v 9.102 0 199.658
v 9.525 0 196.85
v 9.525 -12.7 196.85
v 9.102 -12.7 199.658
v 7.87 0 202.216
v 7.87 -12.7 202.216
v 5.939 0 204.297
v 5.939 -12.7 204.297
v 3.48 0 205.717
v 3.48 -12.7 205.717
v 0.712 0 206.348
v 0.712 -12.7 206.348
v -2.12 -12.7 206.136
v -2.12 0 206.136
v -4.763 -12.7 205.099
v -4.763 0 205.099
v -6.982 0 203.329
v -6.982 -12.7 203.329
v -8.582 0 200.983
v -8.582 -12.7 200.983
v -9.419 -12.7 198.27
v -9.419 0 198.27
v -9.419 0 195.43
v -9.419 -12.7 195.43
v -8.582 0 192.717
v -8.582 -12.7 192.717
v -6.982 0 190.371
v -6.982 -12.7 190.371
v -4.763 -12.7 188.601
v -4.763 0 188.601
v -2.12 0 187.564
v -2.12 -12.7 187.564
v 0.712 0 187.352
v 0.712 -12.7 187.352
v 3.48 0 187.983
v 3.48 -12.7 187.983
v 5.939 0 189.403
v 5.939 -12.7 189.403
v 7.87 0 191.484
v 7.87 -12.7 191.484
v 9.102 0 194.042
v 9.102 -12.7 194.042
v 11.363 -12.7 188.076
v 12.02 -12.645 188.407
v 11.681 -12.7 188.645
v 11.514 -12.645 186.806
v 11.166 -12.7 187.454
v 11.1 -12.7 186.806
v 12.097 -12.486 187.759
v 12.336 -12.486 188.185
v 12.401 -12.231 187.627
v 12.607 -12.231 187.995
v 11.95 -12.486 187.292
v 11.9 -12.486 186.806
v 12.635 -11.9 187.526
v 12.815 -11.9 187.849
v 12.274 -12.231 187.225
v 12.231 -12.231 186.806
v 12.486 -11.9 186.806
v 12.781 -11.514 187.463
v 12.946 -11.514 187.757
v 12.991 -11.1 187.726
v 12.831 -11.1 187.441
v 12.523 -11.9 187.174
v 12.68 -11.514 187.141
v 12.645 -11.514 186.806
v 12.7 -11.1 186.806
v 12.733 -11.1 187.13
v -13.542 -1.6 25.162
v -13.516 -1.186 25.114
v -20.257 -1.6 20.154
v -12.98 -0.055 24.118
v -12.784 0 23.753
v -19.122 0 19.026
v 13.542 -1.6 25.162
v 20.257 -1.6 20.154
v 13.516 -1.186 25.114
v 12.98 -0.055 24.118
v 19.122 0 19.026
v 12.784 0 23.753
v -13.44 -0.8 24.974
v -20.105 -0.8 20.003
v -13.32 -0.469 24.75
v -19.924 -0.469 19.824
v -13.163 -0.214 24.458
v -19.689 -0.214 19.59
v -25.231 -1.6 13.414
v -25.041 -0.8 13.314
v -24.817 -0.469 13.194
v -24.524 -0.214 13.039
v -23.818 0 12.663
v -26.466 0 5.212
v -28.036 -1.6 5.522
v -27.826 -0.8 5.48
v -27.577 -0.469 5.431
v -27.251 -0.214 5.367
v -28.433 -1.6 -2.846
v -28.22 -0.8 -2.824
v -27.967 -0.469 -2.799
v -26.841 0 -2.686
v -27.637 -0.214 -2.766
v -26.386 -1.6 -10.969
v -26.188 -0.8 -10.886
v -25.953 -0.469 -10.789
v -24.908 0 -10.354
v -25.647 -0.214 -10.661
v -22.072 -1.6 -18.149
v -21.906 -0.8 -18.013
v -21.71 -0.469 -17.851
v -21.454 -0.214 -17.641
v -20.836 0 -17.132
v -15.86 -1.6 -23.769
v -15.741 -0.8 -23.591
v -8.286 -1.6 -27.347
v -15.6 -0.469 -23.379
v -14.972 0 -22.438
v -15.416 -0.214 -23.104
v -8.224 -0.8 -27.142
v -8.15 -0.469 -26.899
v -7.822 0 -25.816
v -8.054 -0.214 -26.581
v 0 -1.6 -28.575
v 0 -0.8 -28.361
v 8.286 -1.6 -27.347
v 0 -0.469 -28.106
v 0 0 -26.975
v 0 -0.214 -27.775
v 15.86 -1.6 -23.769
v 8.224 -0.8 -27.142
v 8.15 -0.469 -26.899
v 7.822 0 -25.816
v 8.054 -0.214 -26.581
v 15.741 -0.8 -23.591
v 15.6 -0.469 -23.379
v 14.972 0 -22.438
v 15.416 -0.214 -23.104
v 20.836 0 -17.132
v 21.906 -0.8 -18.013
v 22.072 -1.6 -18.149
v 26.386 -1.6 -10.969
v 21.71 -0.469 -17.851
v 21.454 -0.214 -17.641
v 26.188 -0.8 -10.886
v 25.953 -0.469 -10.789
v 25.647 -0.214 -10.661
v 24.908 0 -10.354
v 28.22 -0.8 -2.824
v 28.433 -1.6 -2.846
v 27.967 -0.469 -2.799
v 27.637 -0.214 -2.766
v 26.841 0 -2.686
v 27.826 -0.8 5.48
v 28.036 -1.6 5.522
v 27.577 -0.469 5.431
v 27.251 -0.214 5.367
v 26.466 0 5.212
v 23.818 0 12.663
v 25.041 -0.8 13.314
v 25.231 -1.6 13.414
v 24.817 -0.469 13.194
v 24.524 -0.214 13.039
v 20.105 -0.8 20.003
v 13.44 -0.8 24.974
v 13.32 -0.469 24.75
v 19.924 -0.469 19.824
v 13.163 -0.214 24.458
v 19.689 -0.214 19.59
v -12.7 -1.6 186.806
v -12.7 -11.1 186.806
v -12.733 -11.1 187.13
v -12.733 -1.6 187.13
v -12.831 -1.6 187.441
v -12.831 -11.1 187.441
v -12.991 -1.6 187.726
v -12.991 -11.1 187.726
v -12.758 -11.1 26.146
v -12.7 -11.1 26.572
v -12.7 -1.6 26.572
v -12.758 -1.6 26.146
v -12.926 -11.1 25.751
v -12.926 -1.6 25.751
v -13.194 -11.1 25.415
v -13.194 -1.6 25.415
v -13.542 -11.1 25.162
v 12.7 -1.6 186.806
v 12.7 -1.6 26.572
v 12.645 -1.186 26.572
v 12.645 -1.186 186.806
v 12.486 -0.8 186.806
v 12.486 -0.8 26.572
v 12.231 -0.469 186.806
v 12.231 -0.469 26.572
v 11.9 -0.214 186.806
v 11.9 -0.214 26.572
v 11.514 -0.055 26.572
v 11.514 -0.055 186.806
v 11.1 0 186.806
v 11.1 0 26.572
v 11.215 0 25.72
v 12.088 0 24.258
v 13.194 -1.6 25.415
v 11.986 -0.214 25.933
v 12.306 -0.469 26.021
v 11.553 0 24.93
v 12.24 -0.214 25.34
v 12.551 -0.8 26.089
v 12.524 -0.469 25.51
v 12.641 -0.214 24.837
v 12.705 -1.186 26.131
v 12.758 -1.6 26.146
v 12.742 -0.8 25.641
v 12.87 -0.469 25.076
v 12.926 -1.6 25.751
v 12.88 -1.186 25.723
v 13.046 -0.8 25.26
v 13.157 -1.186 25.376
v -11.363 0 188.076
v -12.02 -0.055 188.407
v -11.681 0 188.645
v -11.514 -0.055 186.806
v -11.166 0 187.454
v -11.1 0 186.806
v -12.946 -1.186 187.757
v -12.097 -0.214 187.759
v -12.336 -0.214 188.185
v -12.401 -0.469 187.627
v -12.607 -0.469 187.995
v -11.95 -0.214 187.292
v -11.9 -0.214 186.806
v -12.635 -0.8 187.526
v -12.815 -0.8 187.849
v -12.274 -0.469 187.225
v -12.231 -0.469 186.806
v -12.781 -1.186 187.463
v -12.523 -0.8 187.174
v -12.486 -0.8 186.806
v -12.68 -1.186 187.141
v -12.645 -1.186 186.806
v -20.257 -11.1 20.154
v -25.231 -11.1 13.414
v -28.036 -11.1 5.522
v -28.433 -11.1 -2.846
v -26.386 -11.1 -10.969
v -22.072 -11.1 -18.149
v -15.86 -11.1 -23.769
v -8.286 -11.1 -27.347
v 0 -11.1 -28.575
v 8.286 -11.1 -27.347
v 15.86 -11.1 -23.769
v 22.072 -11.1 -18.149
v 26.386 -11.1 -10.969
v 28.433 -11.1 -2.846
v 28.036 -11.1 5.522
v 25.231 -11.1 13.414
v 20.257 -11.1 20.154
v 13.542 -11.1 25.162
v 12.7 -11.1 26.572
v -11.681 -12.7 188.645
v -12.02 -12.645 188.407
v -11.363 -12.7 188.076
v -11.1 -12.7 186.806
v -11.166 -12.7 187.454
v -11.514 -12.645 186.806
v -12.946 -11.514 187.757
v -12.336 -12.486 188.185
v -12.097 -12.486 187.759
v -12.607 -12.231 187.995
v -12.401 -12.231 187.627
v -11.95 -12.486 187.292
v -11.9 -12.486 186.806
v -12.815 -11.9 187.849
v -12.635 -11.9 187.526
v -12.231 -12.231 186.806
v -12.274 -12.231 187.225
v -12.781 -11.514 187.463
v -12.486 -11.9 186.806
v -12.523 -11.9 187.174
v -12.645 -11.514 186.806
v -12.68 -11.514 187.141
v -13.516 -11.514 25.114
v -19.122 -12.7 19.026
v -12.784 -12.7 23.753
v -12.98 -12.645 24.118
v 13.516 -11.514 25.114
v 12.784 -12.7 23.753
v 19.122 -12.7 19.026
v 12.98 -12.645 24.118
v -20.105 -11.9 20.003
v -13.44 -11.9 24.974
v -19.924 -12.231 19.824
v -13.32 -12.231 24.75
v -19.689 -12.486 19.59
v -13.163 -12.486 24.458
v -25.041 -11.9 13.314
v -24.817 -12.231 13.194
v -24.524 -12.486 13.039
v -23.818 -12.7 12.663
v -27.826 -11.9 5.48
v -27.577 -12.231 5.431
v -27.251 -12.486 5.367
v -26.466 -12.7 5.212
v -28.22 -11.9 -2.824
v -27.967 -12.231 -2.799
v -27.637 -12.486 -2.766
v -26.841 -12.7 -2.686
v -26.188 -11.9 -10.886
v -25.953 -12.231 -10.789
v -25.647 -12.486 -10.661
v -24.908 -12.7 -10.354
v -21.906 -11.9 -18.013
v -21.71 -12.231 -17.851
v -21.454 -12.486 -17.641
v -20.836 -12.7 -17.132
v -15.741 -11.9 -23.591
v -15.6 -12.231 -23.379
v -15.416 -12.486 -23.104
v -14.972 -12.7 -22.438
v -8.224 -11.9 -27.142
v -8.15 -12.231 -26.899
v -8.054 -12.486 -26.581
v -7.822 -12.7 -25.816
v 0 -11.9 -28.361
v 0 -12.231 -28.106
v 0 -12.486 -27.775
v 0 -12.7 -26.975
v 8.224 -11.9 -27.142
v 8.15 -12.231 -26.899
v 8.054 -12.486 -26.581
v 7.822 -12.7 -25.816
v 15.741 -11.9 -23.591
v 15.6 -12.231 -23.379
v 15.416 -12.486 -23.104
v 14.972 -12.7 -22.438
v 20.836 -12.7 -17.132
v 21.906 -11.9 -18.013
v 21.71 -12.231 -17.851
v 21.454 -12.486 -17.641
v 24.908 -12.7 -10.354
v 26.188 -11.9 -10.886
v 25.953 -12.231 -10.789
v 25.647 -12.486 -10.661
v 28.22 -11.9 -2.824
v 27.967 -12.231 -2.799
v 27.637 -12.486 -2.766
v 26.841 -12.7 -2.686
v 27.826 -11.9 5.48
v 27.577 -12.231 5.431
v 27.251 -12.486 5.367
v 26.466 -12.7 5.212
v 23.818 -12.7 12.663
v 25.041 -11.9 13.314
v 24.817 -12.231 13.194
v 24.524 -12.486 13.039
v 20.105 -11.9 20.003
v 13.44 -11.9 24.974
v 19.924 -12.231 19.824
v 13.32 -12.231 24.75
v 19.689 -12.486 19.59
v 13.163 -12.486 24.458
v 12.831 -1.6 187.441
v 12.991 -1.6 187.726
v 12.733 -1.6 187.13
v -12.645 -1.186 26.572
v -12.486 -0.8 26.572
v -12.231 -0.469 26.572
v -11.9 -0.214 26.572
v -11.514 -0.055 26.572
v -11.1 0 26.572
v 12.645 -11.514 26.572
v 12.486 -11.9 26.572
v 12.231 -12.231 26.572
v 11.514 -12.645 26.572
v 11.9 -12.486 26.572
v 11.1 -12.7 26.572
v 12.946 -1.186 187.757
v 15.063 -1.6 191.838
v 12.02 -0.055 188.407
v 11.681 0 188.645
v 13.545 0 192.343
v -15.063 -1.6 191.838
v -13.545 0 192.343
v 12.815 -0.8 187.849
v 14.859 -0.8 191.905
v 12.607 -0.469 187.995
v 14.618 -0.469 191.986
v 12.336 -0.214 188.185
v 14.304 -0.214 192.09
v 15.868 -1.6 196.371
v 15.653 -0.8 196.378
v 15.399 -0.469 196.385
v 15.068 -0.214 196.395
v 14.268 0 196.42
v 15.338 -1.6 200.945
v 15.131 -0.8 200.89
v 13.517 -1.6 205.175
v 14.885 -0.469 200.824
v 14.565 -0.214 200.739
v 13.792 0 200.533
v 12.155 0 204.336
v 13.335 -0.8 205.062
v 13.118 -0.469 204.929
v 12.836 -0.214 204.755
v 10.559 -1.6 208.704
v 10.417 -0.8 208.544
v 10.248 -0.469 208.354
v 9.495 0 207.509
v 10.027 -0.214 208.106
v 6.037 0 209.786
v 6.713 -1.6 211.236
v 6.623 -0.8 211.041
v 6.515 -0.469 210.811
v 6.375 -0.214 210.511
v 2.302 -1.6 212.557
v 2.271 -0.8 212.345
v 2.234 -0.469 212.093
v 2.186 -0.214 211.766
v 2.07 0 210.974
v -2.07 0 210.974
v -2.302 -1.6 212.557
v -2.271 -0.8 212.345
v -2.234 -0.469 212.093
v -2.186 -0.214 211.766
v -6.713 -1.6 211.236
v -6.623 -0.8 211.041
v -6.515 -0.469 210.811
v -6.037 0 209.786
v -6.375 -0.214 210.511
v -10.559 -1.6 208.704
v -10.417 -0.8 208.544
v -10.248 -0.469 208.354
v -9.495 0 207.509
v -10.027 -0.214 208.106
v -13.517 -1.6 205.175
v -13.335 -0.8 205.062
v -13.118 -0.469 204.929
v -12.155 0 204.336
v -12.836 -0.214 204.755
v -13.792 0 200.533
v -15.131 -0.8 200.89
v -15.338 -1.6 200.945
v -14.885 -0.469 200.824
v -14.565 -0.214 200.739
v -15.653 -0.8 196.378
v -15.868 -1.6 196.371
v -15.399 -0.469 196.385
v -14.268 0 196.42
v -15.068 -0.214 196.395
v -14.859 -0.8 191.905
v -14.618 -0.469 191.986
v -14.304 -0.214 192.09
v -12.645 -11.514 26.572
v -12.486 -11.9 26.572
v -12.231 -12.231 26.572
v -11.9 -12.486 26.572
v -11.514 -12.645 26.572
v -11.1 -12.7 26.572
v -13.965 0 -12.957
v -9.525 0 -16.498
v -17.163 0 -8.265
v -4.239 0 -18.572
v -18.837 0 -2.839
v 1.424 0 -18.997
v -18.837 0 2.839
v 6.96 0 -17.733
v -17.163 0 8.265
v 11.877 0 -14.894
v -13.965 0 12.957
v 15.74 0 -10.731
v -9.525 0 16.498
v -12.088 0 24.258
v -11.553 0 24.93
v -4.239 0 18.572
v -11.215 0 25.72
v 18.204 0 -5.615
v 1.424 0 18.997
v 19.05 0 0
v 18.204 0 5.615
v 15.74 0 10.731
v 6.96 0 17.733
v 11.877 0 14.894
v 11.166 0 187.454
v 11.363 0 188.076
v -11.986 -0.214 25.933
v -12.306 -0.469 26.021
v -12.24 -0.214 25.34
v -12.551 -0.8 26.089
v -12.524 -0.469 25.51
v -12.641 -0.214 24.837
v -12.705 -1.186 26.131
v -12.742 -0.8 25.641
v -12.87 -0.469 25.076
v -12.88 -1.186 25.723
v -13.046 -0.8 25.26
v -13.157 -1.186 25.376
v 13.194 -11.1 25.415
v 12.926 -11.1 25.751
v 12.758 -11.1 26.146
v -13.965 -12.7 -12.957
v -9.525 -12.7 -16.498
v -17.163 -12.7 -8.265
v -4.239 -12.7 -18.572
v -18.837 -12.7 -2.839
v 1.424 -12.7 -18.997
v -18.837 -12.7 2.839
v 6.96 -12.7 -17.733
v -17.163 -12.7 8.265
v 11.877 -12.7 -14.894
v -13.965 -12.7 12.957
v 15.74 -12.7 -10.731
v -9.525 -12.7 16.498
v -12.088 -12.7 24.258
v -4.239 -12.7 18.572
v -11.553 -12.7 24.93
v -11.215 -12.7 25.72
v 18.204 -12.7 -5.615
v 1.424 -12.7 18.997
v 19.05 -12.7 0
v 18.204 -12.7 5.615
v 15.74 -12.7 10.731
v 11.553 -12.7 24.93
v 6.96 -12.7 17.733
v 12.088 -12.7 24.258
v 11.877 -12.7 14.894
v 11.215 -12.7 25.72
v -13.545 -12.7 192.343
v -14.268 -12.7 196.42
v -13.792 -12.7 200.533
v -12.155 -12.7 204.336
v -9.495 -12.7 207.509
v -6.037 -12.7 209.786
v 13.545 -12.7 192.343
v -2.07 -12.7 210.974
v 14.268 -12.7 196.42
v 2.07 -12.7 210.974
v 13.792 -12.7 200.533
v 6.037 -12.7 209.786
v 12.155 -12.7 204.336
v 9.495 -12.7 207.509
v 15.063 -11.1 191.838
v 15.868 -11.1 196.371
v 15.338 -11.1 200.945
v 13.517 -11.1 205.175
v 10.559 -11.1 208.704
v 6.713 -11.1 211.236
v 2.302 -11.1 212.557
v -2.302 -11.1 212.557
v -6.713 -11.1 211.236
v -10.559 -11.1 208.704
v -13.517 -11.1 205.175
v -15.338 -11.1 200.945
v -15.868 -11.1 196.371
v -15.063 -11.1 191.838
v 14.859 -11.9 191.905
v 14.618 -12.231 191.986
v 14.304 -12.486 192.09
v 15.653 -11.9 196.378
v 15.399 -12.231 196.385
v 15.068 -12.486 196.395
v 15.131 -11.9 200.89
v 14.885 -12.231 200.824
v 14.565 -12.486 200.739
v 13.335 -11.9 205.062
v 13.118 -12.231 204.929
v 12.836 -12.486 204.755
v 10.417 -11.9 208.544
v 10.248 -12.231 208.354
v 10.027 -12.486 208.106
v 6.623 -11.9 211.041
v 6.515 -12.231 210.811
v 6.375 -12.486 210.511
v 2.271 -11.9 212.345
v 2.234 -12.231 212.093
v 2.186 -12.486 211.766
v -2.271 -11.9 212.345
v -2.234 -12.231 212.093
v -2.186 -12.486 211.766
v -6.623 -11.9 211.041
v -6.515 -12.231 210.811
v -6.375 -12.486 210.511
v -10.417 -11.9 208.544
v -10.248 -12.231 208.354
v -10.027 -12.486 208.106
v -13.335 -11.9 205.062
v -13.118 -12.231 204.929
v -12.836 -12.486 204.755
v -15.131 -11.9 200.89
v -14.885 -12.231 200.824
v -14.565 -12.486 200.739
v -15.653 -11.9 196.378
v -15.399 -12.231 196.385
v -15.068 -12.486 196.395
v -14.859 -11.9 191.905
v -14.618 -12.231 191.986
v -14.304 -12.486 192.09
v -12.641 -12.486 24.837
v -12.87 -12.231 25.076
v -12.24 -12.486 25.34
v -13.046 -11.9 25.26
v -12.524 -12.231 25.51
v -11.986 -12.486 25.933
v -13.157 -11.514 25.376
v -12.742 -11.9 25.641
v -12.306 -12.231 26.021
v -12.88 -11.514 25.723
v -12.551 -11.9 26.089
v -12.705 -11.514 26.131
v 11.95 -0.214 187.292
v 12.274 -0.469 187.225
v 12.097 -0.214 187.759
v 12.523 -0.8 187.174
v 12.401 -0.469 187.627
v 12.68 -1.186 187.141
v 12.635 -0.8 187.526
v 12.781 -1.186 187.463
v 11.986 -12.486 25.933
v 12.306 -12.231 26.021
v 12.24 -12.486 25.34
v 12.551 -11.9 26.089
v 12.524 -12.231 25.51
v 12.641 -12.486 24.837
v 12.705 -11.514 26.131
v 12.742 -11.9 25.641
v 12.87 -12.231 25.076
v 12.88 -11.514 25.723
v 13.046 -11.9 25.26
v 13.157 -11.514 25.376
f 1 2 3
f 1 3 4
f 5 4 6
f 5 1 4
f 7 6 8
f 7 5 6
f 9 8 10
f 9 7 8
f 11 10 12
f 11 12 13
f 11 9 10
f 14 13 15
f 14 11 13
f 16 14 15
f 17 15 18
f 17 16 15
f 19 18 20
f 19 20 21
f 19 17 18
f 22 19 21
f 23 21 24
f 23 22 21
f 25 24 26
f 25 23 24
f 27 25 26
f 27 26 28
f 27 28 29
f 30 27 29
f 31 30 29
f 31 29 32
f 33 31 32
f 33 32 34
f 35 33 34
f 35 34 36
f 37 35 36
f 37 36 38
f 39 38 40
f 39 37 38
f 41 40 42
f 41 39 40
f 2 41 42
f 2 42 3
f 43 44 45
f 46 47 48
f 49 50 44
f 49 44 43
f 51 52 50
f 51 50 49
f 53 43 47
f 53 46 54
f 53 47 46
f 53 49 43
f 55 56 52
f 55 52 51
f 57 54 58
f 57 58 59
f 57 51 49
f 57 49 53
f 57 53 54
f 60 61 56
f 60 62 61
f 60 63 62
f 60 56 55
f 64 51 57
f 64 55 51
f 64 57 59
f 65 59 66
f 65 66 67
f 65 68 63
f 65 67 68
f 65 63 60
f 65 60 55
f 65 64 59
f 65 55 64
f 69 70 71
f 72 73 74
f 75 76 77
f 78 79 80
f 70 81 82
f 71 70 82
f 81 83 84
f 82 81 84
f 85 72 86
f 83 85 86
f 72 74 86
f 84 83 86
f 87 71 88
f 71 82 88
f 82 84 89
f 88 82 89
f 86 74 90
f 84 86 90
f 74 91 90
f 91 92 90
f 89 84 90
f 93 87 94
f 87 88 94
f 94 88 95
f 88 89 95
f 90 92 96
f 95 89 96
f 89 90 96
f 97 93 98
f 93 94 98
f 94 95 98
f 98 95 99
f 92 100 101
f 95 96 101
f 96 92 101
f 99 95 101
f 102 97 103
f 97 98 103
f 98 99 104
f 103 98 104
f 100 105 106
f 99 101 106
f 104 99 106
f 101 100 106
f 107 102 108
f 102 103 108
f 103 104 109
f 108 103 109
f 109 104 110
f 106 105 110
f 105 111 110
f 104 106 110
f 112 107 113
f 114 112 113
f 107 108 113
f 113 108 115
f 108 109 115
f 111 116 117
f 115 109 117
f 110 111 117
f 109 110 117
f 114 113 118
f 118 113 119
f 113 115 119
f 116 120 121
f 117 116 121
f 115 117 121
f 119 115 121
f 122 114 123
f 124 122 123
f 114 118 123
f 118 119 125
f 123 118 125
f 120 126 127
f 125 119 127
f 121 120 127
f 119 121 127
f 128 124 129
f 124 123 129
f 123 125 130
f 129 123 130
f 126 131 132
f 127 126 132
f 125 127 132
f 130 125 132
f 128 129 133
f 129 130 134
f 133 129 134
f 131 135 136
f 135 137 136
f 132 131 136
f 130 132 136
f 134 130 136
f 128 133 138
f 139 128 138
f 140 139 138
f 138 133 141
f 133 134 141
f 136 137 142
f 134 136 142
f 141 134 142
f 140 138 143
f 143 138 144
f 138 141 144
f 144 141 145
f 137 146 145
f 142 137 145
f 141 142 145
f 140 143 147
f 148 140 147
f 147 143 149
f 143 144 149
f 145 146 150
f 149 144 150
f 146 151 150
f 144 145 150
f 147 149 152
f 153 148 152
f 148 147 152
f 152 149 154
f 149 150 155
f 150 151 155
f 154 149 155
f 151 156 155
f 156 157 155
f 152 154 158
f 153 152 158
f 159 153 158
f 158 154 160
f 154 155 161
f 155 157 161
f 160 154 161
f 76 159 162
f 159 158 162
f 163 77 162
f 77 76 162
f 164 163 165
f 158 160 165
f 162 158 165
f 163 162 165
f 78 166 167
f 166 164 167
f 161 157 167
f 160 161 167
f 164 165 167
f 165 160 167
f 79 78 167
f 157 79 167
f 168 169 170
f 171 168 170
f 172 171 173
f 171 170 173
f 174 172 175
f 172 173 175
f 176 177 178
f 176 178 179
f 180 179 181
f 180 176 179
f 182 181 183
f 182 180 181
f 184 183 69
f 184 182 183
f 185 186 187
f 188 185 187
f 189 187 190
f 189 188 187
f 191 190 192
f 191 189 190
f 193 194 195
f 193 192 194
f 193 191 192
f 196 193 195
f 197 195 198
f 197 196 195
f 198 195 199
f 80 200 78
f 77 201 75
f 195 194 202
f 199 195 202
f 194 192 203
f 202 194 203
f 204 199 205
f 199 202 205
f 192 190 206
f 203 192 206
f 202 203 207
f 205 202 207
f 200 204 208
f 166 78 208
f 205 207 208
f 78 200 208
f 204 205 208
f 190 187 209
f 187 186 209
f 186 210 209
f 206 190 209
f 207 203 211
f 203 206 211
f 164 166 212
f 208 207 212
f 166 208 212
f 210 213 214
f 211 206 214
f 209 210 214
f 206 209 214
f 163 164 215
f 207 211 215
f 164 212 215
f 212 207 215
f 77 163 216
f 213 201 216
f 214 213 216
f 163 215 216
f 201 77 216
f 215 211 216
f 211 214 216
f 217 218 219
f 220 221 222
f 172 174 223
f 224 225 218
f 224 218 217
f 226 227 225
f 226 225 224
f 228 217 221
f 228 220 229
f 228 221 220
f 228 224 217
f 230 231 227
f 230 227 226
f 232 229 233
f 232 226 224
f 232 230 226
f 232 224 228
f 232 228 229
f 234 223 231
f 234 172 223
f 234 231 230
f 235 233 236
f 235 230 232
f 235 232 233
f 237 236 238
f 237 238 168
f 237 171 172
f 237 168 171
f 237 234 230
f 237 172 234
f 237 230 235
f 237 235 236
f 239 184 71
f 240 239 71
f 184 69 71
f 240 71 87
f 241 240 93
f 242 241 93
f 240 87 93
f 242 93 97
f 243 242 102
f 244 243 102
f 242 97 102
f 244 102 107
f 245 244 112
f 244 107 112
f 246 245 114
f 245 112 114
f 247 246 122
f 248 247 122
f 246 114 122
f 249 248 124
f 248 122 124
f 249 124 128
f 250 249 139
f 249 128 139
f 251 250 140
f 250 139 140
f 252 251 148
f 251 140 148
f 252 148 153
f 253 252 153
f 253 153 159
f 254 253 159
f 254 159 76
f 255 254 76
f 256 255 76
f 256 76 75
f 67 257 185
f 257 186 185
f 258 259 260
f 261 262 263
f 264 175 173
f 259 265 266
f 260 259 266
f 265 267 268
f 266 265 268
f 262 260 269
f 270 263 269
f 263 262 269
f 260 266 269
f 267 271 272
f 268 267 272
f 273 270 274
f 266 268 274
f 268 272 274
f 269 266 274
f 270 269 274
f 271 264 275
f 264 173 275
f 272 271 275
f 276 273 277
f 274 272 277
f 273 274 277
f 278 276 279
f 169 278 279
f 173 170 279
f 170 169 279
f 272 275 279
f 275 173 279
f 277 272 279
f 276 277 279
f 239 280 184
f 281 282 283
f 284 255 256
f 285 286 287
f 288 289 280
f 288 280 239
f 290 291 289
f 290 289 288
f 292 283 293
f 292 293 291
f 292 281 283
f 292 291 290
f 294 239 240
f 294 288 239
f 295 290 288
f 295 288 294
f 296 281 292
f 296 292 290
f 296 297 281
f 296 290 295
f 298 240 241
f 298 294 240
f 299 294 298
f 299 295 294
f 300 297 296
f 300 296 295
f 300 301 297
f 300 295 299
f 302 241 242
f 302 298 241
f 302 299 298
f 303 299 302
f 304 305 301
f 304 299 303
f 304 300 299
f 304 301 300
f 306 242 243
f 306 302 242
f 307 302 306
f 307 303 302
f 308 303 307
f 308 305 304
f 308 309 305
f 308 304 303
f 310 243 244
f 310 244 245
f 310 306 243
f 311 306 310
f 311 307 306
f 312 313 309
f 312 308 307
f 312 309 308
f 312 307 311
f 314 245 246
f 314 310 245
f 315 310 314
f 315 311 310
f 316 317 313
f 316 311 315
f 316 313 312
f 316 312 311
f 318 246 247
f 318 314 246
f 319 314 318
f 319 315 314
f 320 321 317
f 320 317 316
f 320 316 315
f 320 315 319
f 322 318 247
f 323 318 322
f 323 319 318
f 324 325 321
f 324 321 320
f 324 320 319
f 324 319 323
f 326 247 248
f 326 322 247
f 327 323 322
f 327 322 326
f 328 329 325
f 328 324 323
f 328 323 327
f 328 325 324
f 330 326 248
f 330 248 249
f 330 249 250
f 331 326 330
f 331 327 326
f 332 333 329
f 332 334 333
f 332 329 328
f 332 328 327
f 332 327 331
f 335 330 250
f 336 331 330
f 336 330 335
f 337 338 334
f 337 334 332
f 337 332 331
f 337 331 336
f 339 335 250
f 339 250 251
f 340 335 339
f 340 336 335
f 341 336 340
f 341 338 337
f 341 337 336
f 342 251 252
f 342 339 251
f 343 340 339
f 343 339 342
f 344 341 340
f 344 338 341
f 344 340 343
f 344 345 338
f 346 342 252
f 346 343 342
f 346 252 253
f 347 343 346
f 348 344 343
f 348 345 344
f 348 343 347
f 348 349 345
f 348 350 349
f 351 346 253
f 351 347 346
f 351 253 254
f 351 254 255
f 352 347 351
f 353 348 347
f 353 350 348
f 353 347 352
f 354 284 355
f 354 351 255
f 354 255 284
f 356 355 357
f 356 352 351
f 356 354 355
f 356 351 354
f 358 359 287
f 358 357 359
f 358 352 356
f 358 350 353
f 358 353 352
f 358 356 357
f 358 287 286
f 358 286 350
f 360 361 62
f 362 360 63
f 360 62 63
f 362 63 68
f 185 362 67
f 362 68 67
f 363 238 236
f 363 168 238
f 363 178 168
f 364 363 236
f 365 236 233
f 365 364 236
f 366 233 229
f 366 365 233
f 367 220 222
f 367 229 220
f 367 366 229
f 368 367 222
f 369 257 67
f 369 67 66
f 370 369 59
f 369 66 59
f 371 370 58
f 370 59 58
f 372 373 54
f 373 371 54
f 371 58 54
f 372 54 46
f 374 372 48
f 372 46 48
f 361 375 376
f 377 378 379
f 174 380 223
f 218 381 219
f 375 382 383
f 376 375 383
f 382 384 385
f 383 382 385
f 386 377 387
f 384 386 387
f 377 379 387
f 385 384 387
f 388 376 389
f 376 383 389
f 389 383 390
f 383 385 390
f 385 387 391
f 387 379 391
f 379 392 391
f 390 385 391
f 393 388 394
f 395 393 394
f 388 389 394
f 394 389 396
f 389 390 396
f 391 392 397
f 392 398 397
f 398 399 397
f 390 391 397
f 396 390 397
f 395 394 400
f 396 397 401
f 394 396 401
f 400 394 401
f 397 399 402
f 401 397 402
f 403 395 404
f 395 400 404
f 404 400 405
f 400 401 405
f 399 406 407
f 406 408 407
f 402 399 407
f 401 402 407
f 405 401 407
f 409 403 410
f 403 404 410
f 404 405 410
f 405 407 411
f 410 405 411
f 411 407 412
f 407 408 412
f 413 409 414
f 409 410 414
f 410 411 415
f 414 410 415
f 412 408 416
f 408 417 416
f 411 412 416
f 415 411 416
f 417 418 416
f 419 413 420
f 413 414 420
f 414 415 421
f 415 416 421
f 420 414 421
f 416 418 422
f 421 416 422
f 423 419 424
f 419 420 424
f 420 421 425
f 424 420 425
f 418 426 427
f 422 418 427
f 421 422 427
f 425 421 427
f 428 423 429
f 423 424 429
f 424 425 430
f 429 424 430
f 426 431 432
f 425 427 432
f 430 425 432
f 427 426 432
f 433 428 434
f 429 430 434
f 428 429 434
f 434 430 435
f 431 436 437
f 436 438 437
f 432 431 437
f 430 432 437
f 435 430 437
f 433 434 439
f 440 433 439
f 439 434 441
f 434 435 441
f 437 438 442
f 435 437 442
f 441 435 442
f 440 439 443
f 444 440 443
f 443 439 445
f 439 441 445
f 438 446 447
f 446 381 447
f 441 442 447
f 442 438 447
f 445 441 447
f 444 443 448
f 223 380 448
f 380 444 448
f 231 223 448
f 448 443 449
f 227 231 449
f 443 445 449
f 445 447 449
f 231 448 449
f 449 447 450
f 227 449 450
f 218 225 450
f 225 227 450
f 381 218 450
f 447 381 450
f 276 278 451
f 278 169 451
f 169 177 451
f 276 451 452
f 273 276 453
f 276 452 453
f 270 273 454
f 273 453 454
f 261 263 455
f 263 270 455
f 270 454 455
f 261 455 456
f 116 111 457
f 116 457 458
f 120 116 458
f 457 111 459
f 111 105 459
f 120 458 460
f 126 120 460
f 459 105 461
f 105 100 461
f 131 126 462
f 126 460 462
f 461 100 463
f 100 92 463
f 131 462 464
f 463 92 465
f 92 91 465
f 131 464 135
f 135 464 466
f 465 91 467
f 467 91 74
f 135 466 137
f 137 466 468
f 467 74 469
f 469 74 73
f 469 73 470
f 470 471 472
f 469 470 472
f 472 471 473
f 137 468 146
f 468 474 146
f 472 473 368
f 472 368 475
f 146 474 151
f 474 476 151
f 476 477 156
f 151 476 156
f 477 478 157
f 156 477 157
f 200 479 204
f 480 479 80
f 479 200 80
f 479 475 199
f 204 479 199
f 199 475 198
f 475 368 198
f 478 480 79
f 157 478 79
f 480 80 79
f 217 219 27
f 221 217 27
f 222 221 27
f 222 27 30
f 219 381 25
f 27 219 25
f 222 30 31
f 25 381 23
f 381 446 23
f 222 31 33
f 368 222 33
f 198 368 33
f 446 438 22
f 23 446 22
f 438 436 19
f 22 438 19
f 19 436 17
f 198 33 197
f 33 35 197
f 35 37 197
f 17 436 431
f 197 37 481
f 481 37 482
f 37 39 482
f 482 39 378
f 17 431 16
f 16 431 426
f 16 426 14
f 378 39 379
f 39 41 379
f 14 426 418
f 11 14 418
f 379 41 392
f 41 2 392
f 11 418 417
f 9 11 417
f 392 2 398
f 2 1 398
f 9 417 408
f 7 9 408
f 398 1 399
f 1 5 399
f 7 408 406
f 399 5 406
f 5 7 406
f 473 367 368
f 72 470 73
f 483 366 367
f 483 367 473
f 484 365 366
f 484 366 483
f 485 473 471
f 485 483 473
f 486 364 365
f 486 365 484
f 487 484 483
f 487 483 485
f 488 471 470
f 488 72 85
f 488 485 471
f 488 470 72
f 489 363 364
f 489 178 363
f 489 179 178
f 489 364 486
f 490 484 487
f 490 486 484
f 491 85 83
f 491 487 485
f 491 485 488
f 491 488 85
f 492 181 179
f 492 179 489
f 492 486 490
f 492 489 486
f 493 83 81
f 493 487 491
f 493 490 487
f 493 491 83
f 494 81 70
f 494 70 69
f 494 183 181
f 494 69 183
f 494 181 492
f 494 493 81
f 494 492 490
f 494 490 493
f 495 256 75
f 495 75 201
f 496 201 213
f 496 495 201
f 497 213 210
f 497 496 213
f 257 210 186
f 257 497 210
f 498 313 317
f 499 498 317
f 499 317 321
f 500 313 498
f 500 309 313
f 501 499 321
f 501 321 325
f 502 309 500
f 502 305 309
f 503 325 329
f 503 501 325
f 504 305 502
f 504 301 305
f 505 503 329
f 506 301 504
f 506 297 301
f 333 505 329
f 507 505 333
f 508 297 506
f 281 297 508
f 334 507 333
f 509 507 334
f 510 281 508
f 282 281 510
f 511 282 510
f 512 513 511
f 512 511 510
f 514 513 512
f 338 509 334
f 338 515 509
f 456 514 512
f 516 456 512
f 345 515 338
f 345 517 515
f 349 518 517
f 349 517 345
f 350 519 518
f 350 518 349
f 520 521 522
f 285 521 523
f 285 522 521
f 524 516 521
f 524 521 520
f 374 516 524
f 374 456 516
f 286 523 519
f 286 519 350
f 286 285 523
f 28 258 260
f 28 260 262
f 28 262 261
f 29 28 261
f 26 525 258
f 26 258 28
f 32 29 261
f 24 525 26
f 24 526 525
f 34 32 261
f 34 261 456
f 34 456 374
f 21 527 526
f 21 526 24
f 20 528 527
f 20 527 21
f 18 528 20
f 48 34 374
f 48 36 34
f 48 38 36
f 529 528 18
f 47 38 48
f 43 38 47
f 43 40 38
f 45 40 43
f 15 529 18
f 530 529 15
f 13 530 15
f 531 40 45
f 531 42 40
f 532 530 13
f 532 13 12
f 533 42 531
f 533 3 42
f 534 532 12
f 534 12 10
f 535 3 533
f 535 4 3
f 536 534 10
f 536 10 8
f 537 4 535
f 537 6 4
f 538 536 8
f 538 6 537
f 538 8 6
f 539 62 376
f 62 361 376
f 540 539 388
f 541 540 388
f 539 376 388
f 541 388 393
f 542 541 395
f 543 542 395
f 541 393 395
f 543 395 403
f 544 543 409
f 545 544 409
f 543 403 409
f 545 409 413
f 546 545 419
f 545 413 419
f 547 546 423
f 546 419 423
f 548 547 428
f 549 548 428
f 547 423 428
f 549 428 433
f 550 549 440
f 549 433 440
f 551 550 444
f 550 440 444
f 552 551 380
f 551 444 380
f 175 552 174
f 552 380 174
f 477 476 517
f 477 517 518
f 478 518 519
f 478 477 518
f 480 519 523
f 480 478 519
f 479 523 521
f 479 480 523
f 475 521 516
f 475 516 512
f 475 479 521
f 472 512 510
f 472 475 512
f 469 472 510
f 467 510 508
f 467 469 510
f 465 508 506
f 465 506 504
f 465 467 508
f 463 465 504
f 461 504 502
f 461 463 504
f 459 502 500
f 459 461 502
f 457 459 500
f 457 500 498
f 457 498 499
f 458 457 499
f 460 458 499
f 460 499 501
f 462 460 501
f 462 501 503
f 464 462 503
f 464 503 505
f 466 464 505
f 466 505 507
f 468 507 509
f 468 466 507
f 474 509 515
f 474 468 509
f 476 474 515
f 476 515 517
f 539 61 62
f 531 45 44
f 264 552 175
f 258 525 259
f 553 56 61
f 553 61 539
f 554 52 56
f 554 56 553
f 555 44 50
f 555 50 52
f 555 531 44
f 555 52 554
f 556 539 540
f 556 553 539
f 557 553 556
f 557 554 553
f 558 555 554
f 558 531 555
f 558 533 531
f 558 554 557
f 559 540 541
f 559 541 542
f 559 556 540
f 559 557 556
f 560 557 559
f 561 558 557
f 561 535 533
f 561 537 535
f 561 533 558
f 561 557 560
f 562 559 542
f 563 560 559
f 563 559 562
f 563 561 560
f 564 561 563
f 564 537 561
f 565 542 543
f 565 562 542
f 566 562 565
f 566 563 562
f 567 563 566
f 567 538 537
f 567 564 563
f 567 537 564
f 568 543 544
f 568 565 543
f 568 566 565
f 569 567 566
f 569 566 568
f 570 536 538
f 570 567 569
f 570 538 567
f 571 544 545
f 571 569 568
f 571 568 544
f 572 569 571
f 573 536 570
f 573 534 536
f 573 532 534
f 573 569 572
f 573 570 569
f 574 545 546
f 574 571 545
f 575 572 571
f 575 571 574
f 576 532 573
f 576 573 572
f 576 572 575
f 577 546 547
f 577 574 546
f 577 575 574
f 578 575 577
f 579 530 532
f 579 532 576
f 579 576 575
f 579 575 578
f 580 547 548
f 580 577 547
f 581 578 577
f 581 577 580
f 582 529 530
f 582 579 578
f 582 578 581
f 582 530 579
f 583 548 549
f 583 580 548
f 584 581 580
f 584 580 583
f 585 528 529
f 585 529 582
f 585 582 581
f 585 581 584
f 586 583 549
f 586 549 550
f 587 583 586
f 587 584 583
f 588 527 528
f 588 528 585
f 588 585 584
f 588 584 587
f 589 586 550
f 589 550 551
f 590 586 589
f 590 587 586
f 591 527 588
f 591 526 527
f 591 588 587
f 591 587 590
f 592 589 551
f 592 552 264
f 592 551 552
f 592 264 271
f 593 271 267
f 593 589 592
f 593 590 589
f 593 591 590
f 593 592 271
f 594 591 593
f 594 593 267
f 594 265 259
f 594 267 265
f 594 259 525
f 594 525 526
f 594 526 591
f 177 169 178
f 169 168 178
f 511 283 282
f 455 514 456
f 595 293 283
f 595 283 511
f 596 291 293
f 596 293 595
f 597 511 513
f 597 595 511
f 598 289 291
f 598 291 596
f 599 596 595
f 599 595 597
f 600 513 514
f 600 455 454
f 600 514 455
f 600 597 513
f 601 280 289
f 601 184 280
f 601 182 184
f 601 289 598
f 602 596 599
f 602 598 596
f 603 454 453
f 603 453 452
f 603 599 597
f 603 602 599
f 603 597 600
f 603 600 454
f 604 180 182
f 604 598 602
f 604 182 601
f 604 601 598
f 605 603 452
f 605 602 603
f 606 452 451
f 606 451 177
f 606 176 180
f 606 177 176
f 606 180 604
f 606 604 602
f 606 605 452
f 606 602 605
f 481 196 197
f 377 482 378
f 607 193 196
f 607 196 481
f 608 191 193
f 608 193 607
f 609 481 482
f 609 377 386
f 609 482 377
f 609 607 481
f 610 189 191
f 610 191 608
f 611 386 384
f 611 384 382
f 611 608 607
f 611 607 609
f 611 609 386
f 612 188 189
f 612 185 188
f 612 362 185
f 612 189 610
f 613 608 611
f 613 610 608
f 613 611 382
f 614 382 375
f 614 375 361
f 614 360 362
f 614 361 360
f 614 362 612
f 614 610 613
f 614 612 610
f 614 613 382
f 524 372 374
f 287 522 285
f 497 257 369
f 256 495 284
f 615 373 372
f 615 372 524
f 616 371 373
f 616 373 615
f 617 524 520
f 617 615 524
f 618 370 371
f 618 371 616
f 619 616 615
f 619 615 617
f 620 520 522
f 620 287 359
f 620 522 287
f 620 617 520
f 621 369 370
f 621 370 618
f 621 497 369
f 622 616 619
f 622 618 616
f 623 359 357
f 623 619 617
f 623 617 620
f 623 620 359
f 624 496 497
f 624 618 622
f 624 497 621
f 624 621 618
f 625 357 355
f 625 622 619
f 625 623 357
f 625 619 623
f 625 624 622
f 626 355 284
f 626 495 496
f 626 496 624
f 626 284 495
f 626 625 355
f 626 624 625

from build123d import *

# Parameters (mm, degrees)
F0_R     = 19.05
F0_R_2   = 9.525
F1_DEPTH = 12.7
F2_R     = 1.6002


with BuildPart() as f1:
    # F0 (on Front) → F1 (new body)
    with BuildSketch(Plane.XZ):
        with BuildLine():
            Line((-12.7, 187.325), (-12.7, 25.597668))
            ThreePointArc((-12.7, 25.597668), (0, -28.575), (12.7, 25.597668))
            Line((12.7, 25.597668), (12.7, 187.325))
            ThreePointArc((12.7, 187.325), (0, 212.725), (-12.7, 187.325))
        make_face()
        Circle(F0_R, mode=Mode.SUBTRACT)
        with Locations((0, 196.85)):
            Circle(F0_R_2, mode=Mode.SUBTRACT)
    extrude(amount=F1_DEPTH)

    # F2
    f2_edges = [f1.edges().sort_by_distance(p)[0] for p in [
        (0, -12.7, 212.725),
        (12.7, -12.7, 106.461334),
        (0, -12.7, -28.575),
        (-12.7, -12.7, 106.461334),
        (12.7, 0, 106.461334),
        (0, 0, 212.725),
        (-12.7, 0, 106.461334),
        (0, 0, -28.575),
        (12.7, -6.35, 25.597668),
        (12.7, -6.35, 187.325),
        (-12.7, -6.35, 187.325),
        (-12.7, -6.35, 25.597668),
    ]]
    fillet(f2_edges, radius=F2_R)


solid = f1.part
